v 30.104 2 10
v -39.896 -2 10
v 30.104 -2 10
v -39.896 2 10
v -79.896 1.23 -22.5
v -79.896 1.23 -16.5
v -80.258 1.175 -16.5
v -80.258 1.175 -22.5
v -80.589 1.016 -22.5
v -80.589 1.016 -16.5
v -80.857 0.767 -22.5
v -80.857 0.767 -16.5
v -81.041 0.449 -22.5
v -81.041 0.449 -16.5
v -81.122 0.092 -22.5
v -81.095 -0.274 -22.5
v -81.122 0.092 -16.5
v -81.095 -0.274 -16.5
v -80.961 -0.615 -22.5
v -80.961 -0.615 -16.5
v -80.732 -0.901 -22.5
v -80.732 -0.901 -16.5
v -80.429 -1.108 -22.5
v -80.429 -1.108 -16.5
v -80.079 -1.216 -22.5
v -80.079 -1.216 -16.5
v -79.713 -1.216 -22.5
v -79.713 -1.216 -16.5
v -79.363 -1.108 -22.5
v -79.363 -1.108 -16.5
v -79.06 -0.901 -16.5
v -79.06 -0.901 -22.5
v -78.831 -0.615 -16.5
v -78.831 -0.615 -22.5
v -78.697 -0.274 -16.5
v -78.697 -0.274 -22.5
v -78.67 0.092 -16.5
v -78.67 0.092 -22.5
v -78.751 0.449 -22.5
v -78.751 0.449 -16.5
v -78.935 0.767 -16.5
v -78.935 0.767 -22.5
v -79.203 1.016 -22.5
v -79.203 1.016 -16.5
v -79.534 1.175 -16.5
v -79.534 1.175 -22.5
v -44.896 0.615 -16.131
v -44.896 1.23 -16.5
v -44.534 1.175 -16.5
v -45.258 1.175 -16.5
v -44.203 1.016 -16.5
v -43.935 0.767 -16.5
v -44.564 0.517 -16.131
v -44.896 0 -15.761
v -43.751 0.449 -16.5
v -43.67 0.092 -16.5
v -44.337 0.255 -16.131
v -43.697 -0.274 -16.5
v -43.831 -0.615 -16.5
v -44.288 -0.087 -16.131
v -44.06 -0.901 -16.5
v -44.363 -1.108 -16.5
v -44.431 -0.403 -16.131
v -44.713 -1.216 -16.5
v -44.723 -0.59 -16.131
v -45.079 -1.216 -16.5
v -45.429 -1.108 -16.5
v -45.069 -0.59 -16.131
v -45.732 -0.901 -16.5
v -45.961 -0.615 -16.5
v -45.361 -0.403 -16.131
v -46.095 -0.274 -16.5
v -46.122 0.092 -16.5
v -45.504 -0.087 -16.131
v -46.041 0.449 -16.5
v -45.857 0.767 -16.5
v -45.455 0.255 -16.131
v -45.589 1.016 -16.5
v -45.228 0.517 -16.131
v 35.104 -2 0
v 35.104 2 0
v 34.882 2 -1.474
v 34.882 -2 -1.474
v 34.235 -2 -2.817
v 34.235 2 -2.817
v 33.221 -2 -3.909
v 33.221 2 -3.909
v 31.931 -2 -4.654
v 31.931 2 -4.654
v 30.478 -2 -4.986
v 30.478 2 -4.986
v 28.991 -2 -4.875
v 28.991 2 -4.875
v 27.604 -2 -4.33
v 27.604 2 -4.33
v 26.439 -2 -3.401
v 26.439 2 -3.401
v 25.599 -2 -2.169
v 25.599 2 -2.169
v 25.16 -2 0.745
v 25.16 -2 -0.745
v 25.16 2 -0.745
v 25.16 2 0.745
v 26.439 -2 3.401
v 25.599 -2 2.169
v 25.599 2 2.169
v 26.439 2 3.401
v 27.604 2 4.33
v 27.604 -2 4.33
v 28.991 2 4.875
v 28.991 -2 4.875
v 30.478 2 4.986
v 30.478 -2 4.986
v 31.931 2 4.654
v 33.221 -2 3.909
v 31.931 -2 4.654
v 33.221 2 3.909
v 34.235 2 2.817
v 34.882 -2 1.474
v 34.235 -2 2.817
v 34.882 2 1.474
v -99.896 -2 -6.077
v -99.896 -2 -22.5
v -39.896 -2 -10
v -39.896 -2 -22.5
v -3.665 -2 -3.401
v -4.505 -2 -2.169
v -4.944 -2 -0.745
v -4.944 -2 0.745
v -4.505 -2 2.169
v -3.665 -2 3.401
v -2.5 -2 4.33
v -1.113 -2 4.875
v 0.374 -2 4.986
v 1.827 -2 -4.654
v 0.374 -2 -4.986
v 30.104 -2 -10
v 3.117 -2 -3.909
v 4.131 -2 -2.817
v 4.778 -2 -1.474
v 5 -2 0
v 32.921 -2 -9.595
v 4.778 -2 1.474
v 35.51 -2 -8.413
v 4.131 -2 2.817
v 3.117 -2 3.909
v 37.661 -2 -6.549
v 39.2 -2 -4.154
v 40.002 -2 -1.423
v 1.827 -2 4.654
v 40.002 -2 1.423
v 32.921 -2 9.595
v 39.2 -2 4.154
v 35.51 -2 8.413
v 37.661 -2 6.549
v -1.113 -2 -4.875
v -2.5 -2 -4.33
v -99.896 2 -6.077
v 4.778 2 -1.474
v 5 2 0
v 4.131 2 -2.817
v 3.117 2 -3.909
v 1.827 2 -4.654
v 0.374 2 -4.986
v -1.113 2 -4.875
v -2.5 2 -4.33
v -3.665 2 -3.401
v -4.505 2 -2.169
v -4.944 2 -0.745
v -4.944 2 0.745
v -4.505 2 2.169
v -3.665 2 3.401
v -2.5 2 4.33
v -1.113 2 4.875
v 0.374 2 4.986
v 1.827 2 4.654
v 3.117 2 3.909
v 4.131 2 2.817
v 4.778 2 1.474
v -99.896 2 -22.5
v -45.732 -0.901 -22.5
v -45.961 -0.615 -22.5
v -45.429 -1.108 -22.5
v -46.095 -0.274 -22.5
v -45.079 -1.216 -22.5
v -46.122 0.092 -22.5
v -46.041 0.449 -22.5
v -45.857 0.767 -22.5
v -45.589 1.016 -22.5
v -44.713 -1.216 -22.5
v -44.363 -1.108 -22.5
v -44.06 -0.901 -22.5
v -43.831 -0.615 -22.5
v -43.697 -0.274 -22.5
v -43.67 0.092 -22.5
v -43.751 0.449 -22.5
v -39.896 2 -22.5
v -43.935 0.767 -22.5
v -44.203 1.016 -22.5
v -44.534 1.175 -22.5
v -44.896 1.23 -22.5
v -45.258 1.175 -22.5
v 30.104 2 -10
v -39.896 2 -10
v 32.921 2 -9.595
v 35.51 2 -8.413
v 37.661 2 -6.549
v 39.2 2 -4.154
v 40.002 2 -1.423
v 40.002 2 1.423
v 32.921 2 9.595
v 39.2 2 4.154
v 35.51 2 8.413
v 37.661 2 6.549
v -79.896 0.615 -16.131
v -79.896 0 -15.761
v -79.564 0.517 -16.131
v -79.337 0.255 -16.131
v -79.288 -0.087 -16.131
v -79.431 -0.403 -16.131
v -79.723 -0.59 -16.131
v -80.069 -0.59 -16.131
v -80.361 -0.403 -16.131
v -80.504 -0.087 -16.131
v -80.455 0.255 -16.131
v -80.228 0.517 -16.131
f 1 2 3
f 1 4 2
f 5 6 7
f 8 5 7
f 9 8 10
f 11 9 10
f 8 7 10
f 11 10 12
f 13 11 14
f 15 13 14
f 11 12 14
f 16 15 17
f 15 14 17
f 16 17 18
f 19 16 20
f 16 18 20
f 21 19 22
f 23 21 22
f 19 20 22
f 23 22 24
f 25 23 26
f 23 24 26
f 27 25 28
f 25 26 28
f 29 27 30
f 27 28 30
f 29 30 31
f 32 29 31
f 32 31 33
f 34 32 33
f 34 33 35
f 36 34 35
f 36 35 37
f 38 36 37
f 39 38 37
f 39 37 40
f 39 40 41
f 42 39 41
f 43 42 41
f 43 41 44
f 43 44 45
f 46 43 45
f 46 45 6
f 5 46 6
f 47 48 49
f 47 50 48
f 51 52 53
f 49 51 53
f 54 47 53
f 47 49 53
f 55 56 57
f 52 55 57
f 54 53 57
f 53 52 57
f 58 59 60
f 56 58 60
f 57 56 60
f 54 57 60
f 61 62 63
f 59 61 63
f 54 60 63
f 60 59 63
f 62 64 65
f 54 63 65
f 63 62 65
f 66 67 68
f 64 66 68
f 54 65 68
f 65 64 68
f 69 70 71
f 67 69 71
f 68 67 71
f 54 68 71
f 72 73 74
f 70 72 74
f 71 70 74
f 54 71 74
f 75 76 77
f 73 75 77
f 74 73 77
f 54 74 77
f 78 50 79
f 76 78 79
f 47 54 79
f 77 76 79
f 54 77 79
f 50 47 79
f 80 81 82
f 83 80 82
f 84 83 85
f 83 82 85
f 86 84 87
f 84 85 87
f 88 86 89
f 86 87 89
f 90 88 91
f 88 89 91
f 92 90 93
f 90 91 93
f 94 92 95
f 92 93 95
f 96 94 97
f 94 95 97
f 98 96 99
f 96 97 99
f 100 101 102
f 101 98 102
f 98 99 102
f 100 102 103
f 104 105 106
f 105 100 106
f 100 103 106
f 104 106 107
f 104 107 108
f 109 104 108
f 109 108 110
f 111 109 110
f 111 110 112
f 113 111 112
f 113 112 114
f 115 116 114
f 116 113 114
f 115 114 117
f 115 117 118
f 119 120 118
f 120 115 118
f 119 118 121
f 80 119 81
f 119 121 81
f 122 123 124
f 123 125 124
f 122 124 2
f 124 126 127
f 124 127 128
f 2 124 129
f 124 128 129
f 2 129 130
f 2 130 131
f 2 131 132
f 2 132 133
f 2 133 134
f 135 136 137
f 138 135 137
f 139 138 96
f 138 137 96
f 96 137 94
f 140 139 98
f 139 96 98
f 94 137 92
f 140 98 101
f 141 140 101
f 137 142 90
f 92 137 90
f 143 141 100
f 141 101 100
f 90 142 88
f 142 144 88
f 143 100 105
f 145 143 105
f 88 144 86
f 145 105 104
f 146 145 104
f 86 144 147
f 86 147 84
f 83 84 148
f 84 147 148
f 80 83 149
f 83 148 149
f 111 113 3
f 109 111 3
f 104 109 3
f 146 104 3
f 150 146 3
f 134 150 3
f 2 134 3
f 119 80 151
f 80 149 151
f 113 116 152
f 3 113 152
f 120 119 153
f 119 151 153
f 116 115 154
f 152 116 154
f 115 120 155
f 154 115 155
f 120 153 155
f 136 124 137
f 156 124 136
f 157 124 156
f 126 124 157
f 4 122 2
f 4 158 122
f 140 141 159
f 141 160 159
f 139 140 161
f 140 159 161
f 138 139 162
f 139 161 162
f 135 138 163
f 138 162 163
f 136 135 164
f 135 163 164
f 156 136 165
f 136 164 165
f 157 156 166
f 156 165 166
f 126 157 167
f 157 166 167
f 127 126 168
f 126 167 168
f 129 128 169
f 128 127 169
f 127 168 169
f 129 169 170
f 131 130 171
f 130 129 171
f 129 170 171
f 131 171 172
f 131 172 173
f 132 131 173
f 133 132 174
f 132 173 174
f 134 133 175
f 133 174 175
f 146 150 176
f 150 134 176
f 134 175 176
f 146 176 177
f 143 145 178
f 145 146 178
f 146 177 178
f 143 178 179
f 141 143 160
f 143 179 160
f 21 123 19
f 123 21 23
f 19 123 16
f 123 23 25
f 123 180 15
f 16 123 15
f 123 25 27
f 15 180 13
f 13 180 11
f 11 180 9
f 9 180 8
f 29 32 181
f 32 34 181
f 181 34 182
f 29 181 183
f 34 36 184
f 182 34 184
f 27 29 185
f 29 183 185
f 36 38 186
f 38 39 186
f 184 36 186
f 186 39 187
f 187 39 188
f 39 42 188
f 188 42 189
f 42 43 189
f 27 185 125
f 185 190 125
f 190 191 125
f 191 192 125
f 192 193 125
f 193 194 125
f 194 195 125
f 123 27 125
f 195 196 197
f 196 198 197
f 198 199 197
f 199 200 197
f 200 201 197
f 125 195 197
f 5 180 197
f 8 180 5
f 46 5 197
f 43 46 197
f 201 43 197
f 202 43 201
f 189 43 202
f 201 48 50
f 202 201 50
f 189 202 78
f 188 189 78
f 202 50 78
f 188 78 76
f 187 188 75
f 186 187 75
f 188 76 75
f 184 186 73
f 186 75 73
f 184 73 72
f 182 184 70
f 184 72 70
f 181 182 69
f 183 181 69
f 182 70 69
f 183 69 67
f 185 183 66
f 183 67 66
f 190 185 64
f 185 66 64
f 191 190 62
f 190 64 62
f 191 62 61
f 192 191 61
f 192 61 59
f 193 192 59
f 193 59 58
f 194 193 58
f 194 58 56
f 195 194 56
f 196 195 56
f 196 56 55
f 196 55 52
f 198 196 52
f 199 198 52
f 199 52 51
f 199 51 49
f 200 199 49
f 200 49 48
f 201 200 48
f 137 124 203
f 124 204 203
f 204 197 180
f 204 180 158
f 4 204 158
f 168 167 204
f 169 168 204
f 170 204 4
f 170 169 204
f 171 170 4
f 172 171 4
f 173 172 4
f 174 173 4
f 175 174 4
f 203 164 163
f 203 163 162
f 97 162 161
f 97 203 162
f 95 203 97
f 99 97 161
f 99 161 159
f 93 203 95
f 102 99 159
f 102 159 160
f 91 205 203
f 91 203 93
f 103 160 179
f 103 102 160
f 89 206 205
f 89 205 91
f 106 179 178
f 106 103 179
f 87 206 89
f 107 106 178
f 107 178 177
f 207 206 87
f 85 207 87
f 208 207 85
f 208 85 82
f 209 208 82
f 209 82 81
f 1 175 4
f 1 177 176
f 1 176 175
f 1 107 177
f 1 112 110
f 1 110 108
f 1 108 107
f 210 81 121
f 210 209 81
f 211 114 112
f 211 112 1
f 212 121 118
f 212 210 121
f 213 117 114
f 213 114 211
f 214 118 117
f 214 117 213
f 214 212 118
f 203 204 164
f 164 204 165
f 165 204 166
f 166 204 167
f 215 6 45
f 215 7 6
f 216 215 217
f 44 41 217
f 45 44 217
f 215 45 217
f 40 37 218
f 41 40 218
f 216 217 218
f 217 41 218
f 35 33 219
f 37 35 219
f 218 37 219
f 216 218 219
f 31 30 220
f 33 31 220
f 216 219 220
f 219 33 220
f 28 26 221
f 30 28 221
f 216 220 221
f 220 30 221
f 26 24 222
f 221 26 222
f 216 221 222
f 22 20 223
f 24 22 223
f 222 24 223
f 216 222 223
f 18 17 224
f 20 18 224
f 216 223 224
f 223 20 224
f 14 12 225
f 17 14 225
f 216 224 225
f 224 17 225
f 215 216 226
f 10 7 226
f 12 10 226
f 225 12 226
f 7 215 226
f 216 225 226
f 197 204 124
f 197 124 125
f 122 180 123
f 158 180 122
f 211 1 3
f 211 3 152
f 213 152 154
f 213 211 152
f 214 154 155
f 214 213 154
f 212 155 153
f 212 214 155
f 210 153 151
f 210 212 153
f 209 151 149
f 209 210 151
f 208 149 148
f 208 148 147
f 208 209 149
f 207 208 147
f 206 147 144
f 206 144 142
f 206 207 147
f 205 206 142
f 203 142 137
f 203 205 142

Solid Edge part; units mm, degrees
sketch "Sketch1" plane through (0, 0, 0) normal (0, -1, 0) x (1, 0, 0)
  line L0 (-39.896, 10) -> (30.104, 10)
  line L1 (-39.896, -10) -> (30.104, -10)
  line L2 (-39.896, -10) -> (-39.896, -22.5)
  line L3 (-99.896, -22.5) -> (-39.896, -22.5)
  line L4 (-99.896, -10) -> (-99.896, -22.5)
  line L5 (-99.896, -10) -> (-99.896, -6.077)
  line L6 (-99.896, -6.077) -> (-39.896, 10)
  arc A0 (30.104, 10) -> (30.104, -10) centre (30.104, 0) cw
  circle A1 centre (30.104, 0) radius 5
  circle A2 centre (0, 0) radius 5
  dimension "D1" = 10
  dimension "D2" = 30.104
  dimension "D3" = 10
  dimension "D4" = 70
  dimension "D5" = 70
  dimension "D6" = 12.5
  dimension "D7" = 60
  dimension "D8" = 16.423
extrude "Protrusion1" add sketch "Sketch1" along normal mid plane 4
hole "Agujero_1" at (-79.896, 0, -22.5) direction (0, 0, 1) diameter 2.459 depth 6 tip angle 118 thread major 3 thread length 5
hole "Hole1" at (-44.896, 0, -22.5) direction (0, 0, 1) diameter 2.459 depth 6 tip angle 118 thread major 3 thread length 5
properties part number "1976-1500-005" material "Aluminio, 7075-T6"
